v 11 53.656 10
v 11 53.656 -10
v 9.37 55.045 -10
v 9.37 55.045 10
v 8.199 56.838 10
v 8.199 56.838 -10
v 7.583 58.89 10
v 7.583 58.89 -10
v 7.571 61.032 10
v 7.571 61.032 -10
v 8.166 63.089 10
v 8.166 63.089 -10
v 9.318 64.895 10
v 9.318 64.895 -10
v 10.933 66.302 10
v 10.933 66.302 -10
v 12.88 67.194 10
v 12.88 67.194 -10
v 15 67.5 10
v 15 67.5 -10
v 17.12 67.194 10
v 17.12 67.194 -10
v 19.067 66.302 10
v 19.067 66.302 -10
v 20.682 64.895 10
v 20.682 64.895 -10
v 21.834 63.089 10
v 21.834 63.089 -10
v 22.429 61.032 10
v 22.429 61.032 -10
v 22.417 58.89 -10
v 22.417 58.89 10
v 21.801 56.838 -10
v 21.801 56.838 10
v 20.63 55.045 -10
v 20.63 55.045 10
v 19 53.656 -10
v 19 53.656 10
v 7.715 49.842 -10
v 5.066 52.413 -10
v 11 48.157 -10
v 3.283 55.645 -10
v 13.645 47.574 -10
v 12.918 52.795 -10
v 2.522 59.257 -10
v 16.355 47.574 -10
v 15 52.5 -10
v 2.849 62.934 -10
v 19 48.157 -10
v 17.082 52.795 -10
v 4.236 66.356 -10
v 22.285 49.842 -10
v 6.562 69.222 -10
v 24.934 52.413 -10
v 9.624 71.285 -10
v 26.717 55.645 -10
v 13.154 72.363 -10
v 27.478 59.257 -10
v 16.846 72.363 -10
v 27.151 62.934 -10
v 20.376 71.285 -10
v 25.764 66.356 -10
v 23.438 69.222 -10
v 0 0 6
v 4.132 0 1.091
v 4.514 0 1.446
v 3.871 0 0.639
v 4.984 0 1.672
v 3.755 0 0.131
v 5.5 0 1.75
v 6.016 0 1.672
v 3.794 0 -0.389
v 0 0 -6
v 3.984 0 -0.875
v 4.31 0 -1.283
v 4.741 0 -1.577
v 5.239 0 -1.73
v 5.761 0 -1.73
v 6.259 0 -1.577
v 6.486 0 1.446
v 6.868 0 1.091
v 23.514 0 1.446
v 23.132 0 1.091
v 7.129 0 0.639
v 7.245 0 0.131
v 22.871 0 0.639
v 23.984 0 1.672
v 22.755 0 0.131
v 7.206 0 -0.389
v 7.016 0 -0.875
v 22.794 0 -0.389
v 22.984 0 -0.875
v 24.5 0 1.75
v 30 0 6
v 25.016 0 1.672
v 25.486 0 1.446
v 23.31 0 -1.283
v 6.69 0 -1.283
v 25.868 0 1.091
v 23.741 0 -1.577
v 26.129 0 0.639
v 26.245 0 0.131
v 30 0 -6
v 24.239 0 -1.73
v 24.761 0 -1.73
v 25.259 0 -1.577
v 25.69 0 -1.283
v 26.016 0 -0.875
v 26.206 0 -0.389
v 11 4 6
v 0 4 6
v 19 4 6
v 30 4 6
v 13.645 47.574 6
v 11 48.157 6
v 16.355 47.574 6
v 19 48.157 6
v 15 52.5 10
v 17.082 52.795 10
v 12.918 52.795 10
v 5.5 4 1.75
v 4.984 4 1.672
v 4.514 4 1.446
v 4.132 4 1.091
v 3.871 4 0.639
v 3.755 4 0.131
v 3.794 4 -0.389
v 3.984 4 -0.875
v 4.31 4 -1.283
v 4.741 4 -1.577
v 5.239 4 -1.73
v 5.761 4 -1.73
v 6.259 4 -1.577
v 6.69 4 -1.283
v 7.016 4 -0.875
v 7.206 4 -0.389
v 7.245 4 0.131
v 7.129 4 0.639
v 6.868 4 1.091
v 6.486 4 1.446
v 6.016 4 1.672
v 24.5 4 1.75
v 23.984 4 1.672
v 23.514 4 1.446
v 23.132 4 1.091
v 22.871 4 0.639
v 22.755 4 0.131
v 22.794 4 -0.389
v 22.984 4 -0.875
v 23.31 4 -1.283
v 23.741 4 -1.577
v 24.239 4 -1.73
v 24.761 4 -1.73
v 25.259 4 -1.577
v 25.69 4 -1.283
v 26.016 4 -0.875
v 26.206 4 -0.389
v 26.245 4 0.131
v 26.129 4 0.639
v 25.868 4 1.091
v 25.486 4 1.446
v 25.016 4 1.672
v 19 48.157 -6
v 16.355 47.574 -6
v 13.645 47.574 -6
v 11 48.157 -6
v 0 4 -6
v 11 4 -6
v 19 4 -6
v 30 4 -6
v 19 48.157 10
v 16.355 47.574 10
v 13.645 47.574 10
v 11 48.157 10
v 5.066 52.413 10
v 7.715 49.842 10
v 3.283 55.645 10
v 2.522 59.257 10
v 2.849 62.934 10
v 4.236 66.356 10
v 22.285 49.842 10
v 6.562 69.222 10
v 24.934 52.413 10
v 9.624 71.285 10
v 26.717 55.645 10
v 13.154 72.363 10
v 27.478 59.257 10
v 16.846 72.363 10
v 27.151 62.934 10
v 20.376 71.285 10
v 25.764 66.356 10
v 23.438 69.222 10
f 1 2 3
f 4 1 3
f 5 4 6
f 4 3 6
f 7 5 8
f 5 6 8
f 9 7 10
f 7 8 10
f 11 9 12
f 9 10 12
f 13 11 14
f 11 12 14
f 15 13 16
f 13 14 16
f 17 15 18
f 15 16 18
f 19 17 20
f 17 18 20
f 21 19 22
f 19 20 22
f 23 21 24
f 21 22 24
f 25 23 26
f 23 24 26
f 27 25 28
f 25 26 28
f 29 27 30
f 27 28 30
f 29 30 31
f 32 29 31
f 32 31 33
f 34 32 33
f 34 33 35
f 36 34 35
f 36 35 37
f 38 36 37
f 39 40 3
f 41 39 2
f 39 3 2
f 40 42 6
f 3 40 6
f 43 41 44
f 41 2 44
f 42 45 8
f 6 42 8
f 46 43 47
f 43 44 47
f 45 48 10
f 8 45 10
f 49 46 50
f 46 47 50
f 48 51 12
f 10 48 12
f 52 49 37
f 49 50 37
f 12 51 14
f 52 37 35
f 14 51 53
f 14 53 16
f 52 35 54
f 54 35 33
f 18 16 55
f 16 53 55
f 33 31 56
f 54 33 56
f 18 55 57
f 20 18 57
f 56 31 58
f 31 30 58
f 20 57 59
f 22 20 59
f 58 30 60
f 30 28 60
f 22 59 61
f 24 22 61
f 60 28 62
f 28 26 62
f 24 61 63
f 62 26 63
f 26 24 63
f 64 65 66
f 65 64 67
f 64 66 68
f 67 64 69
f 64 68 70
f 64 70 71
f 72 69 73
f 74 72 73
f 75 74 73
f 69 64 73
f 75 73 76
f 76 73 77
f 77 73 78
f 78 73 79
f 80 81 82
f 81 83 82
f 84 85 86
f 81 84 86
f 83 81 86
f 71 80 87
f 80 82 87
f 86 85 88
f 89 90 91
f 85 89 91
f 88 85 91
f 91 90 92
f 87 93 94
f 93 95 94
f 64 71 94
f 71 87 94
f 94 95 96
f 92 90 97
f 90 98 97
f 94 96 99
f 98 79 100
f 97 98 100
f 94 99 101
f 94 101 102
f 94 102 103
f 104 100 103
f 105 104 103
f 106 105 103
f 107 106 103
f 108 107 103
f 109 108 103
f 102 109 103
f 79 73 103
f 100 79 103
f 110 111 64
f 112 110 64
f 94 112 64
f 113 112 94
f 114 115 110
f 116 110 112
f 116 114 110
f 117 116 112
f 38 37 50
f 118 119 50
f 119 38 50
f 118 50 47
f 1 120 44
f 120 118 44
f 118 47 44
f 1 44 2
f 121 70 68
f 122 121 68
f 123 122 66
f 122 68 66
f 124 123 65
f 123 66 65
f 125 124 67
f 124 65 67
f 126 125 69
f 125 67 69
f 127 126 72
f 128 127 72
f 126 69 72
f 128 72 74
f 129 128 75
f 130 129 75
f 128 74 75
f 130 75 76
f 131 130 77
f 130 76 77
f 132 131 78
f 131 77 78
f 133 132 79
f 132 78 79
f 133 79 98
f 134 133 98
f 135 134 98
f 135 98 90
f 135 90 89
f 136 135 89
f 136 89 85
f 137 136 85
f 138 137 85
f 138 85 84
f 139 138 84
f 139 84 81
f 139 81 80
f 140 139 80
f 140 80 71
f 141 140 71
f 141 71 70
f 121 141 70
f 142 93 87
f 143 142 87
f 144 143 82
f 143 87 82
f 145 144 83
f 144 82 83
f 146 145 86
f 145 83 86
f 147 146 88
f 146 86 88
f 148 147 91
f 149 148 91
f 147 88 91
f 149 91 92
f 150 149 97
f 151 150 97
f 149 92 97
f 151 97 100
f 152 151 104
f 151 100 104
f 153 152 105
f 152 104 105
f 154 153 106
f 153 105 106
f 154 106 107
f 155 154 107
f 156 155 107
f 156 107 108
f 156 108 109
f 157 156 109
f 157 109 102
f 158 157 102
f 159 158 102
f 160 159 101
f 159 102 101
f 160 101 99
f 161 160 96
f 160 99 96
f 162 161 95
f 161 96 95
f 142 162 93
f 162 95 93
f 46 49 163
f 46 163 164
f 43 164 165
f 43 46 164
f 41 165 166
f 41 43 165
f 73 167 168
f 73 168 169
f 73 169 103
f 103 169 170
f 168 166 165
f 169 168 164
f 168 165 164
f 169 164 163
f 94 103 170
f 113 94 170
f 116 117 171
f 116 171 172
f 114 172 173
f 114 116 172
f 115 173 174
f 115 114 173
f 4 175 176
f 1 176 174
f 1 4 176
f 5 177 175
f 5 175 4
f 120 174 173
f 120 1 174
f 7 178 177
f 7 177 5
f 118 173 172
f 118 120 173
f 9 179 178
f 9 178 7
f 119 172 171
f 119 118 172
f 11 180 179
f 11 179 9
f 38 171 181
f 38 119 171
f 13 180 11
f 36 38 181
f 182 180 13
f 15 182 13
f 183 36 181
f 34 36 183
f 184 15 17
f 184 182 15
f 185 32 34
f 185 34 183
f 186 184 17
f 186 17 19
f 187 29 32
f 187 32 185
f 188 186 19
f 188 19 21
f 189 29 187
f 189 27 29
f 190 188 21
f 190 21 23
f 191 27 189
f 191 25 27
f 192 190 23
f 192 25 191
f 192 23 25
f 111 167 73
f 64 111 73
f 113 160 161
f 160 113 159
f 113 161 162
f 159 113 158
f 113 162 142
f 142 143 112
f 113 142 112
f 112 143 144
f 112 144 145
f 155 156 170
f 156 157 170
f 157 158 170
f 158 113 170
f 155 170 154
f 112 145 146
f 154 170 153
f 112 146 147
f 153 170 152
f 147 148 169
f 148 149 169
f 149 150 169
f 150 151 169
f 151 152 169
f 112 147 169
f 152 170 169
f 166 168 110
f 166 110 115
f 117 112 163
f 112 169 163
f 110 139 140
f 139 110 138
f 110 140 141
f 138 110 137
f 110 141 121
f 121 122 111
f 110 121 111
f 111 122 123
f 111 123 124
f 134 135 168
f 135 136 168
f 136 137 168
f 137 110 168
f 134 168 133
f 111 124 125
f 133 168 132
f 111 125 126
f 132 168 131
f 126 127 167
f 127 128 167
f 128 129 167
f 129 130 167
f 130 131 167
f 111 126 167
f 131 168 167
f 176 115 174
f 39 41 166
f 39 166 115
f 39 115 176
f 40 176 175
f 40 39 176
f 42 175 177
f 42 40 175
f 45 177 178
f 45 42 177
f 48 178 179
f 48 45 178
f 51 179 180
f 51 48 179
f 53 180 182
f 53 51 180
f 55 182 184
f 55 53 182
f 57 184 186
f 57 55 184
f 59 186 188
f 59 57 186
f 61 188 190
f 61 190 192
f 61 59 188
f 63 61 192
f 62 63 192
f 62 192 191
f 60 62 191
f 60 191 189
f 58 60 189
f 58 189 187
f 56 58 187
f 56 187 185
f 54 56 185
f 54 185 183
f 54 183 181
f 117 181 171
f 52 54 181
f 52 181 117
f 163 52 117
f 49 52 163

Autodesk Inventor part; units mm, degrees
ref_plane "YZ Plane" through (0, 0, 0) normal (1, 0, 0) x (0, 1, 0)
ref_plane "XZ Plane" through (0, 0, 0) normal (0, 1, 0) x (-1, 0, 0)
ref_plane "XY Plane" through (0, 0, 0) normal (0, 0, 1) x (1, 0, 0)
sketch "Sketch1" plane through (0, 0, 0) normal (0, 0, 1) x (1, 0, 0)
  line L0 (0, 0) -> (30, 0)
  line L1 (30, 0) -> (30, 4)
  line L2 (30, 4) -> (0, 4)
  line L3 (0, 4) -> (0, 0)
  line L4 (15, 4) -> (11, 4)
  line L5 (15, 4) -> (19, 4)
  line L6 (11, 4) -> (11, 60)
  line L7 (19, 4) -> (19, 60)
  line L8 (11, 60) -> (19, 60)
  circle A0 centre (15, 60) radius 7.5
  circle A1 centre (15, 60) radius 12.5
  arc A2 (11, 48.1573) -> (19, 48.1573) centre (15, 60) ccw
  arc A3 (11, 53.6557) -> (19, 53.6557) centre (15, 60) ccw
  dimension "d0" = 30
  dimension "d1" = 4
  dimension "d2" = 4
  dimension "d3" = 4
  dimension "d5" = 60
  dimension "d6" = 15
  dimension "d7" = 25
extrude "Extrusion1" add sketch "Sketch1" along normal mid plane 12 contours L3 L2 L1 L0 | L6 A1 L7 L2
extrude "Extrusion2" add sketch "Sketch1" along normal mid plane 20 contours A1 L7 A0 L6 | L6 A0 L7 A1
sketch "Sketch2" plane through (19, 4, 6) normal (0, 1, 0) x (1, 0, 0)
  line L0 (0, 12) -> (0, 0) projected
  line L1 (11, 0) -> (0, 0) projected
  line L2 (11, 12) -> (11, 0) projected
  line L3 (0, 12) -> (11, 12) projected
  line L4 (0, 6) -> (11, 6)
  point P0 (-19, 6)
  point P1 (5.5, 6)
hole "Hole1" at (24.5, 4, 0) direction (0, -1, 0) diameter 3.5 end up to surface
ref_plane "Work Plane1" through (15, 4, -6) normal (-1, 0, 0) x (0, 0, 1)
mirror "Mirror1" about plane through (15, 4, -6) normal (-1, 0, 0) of "Hole1"
equation "\"d2\" = d3"
properties part number "rearSight"
